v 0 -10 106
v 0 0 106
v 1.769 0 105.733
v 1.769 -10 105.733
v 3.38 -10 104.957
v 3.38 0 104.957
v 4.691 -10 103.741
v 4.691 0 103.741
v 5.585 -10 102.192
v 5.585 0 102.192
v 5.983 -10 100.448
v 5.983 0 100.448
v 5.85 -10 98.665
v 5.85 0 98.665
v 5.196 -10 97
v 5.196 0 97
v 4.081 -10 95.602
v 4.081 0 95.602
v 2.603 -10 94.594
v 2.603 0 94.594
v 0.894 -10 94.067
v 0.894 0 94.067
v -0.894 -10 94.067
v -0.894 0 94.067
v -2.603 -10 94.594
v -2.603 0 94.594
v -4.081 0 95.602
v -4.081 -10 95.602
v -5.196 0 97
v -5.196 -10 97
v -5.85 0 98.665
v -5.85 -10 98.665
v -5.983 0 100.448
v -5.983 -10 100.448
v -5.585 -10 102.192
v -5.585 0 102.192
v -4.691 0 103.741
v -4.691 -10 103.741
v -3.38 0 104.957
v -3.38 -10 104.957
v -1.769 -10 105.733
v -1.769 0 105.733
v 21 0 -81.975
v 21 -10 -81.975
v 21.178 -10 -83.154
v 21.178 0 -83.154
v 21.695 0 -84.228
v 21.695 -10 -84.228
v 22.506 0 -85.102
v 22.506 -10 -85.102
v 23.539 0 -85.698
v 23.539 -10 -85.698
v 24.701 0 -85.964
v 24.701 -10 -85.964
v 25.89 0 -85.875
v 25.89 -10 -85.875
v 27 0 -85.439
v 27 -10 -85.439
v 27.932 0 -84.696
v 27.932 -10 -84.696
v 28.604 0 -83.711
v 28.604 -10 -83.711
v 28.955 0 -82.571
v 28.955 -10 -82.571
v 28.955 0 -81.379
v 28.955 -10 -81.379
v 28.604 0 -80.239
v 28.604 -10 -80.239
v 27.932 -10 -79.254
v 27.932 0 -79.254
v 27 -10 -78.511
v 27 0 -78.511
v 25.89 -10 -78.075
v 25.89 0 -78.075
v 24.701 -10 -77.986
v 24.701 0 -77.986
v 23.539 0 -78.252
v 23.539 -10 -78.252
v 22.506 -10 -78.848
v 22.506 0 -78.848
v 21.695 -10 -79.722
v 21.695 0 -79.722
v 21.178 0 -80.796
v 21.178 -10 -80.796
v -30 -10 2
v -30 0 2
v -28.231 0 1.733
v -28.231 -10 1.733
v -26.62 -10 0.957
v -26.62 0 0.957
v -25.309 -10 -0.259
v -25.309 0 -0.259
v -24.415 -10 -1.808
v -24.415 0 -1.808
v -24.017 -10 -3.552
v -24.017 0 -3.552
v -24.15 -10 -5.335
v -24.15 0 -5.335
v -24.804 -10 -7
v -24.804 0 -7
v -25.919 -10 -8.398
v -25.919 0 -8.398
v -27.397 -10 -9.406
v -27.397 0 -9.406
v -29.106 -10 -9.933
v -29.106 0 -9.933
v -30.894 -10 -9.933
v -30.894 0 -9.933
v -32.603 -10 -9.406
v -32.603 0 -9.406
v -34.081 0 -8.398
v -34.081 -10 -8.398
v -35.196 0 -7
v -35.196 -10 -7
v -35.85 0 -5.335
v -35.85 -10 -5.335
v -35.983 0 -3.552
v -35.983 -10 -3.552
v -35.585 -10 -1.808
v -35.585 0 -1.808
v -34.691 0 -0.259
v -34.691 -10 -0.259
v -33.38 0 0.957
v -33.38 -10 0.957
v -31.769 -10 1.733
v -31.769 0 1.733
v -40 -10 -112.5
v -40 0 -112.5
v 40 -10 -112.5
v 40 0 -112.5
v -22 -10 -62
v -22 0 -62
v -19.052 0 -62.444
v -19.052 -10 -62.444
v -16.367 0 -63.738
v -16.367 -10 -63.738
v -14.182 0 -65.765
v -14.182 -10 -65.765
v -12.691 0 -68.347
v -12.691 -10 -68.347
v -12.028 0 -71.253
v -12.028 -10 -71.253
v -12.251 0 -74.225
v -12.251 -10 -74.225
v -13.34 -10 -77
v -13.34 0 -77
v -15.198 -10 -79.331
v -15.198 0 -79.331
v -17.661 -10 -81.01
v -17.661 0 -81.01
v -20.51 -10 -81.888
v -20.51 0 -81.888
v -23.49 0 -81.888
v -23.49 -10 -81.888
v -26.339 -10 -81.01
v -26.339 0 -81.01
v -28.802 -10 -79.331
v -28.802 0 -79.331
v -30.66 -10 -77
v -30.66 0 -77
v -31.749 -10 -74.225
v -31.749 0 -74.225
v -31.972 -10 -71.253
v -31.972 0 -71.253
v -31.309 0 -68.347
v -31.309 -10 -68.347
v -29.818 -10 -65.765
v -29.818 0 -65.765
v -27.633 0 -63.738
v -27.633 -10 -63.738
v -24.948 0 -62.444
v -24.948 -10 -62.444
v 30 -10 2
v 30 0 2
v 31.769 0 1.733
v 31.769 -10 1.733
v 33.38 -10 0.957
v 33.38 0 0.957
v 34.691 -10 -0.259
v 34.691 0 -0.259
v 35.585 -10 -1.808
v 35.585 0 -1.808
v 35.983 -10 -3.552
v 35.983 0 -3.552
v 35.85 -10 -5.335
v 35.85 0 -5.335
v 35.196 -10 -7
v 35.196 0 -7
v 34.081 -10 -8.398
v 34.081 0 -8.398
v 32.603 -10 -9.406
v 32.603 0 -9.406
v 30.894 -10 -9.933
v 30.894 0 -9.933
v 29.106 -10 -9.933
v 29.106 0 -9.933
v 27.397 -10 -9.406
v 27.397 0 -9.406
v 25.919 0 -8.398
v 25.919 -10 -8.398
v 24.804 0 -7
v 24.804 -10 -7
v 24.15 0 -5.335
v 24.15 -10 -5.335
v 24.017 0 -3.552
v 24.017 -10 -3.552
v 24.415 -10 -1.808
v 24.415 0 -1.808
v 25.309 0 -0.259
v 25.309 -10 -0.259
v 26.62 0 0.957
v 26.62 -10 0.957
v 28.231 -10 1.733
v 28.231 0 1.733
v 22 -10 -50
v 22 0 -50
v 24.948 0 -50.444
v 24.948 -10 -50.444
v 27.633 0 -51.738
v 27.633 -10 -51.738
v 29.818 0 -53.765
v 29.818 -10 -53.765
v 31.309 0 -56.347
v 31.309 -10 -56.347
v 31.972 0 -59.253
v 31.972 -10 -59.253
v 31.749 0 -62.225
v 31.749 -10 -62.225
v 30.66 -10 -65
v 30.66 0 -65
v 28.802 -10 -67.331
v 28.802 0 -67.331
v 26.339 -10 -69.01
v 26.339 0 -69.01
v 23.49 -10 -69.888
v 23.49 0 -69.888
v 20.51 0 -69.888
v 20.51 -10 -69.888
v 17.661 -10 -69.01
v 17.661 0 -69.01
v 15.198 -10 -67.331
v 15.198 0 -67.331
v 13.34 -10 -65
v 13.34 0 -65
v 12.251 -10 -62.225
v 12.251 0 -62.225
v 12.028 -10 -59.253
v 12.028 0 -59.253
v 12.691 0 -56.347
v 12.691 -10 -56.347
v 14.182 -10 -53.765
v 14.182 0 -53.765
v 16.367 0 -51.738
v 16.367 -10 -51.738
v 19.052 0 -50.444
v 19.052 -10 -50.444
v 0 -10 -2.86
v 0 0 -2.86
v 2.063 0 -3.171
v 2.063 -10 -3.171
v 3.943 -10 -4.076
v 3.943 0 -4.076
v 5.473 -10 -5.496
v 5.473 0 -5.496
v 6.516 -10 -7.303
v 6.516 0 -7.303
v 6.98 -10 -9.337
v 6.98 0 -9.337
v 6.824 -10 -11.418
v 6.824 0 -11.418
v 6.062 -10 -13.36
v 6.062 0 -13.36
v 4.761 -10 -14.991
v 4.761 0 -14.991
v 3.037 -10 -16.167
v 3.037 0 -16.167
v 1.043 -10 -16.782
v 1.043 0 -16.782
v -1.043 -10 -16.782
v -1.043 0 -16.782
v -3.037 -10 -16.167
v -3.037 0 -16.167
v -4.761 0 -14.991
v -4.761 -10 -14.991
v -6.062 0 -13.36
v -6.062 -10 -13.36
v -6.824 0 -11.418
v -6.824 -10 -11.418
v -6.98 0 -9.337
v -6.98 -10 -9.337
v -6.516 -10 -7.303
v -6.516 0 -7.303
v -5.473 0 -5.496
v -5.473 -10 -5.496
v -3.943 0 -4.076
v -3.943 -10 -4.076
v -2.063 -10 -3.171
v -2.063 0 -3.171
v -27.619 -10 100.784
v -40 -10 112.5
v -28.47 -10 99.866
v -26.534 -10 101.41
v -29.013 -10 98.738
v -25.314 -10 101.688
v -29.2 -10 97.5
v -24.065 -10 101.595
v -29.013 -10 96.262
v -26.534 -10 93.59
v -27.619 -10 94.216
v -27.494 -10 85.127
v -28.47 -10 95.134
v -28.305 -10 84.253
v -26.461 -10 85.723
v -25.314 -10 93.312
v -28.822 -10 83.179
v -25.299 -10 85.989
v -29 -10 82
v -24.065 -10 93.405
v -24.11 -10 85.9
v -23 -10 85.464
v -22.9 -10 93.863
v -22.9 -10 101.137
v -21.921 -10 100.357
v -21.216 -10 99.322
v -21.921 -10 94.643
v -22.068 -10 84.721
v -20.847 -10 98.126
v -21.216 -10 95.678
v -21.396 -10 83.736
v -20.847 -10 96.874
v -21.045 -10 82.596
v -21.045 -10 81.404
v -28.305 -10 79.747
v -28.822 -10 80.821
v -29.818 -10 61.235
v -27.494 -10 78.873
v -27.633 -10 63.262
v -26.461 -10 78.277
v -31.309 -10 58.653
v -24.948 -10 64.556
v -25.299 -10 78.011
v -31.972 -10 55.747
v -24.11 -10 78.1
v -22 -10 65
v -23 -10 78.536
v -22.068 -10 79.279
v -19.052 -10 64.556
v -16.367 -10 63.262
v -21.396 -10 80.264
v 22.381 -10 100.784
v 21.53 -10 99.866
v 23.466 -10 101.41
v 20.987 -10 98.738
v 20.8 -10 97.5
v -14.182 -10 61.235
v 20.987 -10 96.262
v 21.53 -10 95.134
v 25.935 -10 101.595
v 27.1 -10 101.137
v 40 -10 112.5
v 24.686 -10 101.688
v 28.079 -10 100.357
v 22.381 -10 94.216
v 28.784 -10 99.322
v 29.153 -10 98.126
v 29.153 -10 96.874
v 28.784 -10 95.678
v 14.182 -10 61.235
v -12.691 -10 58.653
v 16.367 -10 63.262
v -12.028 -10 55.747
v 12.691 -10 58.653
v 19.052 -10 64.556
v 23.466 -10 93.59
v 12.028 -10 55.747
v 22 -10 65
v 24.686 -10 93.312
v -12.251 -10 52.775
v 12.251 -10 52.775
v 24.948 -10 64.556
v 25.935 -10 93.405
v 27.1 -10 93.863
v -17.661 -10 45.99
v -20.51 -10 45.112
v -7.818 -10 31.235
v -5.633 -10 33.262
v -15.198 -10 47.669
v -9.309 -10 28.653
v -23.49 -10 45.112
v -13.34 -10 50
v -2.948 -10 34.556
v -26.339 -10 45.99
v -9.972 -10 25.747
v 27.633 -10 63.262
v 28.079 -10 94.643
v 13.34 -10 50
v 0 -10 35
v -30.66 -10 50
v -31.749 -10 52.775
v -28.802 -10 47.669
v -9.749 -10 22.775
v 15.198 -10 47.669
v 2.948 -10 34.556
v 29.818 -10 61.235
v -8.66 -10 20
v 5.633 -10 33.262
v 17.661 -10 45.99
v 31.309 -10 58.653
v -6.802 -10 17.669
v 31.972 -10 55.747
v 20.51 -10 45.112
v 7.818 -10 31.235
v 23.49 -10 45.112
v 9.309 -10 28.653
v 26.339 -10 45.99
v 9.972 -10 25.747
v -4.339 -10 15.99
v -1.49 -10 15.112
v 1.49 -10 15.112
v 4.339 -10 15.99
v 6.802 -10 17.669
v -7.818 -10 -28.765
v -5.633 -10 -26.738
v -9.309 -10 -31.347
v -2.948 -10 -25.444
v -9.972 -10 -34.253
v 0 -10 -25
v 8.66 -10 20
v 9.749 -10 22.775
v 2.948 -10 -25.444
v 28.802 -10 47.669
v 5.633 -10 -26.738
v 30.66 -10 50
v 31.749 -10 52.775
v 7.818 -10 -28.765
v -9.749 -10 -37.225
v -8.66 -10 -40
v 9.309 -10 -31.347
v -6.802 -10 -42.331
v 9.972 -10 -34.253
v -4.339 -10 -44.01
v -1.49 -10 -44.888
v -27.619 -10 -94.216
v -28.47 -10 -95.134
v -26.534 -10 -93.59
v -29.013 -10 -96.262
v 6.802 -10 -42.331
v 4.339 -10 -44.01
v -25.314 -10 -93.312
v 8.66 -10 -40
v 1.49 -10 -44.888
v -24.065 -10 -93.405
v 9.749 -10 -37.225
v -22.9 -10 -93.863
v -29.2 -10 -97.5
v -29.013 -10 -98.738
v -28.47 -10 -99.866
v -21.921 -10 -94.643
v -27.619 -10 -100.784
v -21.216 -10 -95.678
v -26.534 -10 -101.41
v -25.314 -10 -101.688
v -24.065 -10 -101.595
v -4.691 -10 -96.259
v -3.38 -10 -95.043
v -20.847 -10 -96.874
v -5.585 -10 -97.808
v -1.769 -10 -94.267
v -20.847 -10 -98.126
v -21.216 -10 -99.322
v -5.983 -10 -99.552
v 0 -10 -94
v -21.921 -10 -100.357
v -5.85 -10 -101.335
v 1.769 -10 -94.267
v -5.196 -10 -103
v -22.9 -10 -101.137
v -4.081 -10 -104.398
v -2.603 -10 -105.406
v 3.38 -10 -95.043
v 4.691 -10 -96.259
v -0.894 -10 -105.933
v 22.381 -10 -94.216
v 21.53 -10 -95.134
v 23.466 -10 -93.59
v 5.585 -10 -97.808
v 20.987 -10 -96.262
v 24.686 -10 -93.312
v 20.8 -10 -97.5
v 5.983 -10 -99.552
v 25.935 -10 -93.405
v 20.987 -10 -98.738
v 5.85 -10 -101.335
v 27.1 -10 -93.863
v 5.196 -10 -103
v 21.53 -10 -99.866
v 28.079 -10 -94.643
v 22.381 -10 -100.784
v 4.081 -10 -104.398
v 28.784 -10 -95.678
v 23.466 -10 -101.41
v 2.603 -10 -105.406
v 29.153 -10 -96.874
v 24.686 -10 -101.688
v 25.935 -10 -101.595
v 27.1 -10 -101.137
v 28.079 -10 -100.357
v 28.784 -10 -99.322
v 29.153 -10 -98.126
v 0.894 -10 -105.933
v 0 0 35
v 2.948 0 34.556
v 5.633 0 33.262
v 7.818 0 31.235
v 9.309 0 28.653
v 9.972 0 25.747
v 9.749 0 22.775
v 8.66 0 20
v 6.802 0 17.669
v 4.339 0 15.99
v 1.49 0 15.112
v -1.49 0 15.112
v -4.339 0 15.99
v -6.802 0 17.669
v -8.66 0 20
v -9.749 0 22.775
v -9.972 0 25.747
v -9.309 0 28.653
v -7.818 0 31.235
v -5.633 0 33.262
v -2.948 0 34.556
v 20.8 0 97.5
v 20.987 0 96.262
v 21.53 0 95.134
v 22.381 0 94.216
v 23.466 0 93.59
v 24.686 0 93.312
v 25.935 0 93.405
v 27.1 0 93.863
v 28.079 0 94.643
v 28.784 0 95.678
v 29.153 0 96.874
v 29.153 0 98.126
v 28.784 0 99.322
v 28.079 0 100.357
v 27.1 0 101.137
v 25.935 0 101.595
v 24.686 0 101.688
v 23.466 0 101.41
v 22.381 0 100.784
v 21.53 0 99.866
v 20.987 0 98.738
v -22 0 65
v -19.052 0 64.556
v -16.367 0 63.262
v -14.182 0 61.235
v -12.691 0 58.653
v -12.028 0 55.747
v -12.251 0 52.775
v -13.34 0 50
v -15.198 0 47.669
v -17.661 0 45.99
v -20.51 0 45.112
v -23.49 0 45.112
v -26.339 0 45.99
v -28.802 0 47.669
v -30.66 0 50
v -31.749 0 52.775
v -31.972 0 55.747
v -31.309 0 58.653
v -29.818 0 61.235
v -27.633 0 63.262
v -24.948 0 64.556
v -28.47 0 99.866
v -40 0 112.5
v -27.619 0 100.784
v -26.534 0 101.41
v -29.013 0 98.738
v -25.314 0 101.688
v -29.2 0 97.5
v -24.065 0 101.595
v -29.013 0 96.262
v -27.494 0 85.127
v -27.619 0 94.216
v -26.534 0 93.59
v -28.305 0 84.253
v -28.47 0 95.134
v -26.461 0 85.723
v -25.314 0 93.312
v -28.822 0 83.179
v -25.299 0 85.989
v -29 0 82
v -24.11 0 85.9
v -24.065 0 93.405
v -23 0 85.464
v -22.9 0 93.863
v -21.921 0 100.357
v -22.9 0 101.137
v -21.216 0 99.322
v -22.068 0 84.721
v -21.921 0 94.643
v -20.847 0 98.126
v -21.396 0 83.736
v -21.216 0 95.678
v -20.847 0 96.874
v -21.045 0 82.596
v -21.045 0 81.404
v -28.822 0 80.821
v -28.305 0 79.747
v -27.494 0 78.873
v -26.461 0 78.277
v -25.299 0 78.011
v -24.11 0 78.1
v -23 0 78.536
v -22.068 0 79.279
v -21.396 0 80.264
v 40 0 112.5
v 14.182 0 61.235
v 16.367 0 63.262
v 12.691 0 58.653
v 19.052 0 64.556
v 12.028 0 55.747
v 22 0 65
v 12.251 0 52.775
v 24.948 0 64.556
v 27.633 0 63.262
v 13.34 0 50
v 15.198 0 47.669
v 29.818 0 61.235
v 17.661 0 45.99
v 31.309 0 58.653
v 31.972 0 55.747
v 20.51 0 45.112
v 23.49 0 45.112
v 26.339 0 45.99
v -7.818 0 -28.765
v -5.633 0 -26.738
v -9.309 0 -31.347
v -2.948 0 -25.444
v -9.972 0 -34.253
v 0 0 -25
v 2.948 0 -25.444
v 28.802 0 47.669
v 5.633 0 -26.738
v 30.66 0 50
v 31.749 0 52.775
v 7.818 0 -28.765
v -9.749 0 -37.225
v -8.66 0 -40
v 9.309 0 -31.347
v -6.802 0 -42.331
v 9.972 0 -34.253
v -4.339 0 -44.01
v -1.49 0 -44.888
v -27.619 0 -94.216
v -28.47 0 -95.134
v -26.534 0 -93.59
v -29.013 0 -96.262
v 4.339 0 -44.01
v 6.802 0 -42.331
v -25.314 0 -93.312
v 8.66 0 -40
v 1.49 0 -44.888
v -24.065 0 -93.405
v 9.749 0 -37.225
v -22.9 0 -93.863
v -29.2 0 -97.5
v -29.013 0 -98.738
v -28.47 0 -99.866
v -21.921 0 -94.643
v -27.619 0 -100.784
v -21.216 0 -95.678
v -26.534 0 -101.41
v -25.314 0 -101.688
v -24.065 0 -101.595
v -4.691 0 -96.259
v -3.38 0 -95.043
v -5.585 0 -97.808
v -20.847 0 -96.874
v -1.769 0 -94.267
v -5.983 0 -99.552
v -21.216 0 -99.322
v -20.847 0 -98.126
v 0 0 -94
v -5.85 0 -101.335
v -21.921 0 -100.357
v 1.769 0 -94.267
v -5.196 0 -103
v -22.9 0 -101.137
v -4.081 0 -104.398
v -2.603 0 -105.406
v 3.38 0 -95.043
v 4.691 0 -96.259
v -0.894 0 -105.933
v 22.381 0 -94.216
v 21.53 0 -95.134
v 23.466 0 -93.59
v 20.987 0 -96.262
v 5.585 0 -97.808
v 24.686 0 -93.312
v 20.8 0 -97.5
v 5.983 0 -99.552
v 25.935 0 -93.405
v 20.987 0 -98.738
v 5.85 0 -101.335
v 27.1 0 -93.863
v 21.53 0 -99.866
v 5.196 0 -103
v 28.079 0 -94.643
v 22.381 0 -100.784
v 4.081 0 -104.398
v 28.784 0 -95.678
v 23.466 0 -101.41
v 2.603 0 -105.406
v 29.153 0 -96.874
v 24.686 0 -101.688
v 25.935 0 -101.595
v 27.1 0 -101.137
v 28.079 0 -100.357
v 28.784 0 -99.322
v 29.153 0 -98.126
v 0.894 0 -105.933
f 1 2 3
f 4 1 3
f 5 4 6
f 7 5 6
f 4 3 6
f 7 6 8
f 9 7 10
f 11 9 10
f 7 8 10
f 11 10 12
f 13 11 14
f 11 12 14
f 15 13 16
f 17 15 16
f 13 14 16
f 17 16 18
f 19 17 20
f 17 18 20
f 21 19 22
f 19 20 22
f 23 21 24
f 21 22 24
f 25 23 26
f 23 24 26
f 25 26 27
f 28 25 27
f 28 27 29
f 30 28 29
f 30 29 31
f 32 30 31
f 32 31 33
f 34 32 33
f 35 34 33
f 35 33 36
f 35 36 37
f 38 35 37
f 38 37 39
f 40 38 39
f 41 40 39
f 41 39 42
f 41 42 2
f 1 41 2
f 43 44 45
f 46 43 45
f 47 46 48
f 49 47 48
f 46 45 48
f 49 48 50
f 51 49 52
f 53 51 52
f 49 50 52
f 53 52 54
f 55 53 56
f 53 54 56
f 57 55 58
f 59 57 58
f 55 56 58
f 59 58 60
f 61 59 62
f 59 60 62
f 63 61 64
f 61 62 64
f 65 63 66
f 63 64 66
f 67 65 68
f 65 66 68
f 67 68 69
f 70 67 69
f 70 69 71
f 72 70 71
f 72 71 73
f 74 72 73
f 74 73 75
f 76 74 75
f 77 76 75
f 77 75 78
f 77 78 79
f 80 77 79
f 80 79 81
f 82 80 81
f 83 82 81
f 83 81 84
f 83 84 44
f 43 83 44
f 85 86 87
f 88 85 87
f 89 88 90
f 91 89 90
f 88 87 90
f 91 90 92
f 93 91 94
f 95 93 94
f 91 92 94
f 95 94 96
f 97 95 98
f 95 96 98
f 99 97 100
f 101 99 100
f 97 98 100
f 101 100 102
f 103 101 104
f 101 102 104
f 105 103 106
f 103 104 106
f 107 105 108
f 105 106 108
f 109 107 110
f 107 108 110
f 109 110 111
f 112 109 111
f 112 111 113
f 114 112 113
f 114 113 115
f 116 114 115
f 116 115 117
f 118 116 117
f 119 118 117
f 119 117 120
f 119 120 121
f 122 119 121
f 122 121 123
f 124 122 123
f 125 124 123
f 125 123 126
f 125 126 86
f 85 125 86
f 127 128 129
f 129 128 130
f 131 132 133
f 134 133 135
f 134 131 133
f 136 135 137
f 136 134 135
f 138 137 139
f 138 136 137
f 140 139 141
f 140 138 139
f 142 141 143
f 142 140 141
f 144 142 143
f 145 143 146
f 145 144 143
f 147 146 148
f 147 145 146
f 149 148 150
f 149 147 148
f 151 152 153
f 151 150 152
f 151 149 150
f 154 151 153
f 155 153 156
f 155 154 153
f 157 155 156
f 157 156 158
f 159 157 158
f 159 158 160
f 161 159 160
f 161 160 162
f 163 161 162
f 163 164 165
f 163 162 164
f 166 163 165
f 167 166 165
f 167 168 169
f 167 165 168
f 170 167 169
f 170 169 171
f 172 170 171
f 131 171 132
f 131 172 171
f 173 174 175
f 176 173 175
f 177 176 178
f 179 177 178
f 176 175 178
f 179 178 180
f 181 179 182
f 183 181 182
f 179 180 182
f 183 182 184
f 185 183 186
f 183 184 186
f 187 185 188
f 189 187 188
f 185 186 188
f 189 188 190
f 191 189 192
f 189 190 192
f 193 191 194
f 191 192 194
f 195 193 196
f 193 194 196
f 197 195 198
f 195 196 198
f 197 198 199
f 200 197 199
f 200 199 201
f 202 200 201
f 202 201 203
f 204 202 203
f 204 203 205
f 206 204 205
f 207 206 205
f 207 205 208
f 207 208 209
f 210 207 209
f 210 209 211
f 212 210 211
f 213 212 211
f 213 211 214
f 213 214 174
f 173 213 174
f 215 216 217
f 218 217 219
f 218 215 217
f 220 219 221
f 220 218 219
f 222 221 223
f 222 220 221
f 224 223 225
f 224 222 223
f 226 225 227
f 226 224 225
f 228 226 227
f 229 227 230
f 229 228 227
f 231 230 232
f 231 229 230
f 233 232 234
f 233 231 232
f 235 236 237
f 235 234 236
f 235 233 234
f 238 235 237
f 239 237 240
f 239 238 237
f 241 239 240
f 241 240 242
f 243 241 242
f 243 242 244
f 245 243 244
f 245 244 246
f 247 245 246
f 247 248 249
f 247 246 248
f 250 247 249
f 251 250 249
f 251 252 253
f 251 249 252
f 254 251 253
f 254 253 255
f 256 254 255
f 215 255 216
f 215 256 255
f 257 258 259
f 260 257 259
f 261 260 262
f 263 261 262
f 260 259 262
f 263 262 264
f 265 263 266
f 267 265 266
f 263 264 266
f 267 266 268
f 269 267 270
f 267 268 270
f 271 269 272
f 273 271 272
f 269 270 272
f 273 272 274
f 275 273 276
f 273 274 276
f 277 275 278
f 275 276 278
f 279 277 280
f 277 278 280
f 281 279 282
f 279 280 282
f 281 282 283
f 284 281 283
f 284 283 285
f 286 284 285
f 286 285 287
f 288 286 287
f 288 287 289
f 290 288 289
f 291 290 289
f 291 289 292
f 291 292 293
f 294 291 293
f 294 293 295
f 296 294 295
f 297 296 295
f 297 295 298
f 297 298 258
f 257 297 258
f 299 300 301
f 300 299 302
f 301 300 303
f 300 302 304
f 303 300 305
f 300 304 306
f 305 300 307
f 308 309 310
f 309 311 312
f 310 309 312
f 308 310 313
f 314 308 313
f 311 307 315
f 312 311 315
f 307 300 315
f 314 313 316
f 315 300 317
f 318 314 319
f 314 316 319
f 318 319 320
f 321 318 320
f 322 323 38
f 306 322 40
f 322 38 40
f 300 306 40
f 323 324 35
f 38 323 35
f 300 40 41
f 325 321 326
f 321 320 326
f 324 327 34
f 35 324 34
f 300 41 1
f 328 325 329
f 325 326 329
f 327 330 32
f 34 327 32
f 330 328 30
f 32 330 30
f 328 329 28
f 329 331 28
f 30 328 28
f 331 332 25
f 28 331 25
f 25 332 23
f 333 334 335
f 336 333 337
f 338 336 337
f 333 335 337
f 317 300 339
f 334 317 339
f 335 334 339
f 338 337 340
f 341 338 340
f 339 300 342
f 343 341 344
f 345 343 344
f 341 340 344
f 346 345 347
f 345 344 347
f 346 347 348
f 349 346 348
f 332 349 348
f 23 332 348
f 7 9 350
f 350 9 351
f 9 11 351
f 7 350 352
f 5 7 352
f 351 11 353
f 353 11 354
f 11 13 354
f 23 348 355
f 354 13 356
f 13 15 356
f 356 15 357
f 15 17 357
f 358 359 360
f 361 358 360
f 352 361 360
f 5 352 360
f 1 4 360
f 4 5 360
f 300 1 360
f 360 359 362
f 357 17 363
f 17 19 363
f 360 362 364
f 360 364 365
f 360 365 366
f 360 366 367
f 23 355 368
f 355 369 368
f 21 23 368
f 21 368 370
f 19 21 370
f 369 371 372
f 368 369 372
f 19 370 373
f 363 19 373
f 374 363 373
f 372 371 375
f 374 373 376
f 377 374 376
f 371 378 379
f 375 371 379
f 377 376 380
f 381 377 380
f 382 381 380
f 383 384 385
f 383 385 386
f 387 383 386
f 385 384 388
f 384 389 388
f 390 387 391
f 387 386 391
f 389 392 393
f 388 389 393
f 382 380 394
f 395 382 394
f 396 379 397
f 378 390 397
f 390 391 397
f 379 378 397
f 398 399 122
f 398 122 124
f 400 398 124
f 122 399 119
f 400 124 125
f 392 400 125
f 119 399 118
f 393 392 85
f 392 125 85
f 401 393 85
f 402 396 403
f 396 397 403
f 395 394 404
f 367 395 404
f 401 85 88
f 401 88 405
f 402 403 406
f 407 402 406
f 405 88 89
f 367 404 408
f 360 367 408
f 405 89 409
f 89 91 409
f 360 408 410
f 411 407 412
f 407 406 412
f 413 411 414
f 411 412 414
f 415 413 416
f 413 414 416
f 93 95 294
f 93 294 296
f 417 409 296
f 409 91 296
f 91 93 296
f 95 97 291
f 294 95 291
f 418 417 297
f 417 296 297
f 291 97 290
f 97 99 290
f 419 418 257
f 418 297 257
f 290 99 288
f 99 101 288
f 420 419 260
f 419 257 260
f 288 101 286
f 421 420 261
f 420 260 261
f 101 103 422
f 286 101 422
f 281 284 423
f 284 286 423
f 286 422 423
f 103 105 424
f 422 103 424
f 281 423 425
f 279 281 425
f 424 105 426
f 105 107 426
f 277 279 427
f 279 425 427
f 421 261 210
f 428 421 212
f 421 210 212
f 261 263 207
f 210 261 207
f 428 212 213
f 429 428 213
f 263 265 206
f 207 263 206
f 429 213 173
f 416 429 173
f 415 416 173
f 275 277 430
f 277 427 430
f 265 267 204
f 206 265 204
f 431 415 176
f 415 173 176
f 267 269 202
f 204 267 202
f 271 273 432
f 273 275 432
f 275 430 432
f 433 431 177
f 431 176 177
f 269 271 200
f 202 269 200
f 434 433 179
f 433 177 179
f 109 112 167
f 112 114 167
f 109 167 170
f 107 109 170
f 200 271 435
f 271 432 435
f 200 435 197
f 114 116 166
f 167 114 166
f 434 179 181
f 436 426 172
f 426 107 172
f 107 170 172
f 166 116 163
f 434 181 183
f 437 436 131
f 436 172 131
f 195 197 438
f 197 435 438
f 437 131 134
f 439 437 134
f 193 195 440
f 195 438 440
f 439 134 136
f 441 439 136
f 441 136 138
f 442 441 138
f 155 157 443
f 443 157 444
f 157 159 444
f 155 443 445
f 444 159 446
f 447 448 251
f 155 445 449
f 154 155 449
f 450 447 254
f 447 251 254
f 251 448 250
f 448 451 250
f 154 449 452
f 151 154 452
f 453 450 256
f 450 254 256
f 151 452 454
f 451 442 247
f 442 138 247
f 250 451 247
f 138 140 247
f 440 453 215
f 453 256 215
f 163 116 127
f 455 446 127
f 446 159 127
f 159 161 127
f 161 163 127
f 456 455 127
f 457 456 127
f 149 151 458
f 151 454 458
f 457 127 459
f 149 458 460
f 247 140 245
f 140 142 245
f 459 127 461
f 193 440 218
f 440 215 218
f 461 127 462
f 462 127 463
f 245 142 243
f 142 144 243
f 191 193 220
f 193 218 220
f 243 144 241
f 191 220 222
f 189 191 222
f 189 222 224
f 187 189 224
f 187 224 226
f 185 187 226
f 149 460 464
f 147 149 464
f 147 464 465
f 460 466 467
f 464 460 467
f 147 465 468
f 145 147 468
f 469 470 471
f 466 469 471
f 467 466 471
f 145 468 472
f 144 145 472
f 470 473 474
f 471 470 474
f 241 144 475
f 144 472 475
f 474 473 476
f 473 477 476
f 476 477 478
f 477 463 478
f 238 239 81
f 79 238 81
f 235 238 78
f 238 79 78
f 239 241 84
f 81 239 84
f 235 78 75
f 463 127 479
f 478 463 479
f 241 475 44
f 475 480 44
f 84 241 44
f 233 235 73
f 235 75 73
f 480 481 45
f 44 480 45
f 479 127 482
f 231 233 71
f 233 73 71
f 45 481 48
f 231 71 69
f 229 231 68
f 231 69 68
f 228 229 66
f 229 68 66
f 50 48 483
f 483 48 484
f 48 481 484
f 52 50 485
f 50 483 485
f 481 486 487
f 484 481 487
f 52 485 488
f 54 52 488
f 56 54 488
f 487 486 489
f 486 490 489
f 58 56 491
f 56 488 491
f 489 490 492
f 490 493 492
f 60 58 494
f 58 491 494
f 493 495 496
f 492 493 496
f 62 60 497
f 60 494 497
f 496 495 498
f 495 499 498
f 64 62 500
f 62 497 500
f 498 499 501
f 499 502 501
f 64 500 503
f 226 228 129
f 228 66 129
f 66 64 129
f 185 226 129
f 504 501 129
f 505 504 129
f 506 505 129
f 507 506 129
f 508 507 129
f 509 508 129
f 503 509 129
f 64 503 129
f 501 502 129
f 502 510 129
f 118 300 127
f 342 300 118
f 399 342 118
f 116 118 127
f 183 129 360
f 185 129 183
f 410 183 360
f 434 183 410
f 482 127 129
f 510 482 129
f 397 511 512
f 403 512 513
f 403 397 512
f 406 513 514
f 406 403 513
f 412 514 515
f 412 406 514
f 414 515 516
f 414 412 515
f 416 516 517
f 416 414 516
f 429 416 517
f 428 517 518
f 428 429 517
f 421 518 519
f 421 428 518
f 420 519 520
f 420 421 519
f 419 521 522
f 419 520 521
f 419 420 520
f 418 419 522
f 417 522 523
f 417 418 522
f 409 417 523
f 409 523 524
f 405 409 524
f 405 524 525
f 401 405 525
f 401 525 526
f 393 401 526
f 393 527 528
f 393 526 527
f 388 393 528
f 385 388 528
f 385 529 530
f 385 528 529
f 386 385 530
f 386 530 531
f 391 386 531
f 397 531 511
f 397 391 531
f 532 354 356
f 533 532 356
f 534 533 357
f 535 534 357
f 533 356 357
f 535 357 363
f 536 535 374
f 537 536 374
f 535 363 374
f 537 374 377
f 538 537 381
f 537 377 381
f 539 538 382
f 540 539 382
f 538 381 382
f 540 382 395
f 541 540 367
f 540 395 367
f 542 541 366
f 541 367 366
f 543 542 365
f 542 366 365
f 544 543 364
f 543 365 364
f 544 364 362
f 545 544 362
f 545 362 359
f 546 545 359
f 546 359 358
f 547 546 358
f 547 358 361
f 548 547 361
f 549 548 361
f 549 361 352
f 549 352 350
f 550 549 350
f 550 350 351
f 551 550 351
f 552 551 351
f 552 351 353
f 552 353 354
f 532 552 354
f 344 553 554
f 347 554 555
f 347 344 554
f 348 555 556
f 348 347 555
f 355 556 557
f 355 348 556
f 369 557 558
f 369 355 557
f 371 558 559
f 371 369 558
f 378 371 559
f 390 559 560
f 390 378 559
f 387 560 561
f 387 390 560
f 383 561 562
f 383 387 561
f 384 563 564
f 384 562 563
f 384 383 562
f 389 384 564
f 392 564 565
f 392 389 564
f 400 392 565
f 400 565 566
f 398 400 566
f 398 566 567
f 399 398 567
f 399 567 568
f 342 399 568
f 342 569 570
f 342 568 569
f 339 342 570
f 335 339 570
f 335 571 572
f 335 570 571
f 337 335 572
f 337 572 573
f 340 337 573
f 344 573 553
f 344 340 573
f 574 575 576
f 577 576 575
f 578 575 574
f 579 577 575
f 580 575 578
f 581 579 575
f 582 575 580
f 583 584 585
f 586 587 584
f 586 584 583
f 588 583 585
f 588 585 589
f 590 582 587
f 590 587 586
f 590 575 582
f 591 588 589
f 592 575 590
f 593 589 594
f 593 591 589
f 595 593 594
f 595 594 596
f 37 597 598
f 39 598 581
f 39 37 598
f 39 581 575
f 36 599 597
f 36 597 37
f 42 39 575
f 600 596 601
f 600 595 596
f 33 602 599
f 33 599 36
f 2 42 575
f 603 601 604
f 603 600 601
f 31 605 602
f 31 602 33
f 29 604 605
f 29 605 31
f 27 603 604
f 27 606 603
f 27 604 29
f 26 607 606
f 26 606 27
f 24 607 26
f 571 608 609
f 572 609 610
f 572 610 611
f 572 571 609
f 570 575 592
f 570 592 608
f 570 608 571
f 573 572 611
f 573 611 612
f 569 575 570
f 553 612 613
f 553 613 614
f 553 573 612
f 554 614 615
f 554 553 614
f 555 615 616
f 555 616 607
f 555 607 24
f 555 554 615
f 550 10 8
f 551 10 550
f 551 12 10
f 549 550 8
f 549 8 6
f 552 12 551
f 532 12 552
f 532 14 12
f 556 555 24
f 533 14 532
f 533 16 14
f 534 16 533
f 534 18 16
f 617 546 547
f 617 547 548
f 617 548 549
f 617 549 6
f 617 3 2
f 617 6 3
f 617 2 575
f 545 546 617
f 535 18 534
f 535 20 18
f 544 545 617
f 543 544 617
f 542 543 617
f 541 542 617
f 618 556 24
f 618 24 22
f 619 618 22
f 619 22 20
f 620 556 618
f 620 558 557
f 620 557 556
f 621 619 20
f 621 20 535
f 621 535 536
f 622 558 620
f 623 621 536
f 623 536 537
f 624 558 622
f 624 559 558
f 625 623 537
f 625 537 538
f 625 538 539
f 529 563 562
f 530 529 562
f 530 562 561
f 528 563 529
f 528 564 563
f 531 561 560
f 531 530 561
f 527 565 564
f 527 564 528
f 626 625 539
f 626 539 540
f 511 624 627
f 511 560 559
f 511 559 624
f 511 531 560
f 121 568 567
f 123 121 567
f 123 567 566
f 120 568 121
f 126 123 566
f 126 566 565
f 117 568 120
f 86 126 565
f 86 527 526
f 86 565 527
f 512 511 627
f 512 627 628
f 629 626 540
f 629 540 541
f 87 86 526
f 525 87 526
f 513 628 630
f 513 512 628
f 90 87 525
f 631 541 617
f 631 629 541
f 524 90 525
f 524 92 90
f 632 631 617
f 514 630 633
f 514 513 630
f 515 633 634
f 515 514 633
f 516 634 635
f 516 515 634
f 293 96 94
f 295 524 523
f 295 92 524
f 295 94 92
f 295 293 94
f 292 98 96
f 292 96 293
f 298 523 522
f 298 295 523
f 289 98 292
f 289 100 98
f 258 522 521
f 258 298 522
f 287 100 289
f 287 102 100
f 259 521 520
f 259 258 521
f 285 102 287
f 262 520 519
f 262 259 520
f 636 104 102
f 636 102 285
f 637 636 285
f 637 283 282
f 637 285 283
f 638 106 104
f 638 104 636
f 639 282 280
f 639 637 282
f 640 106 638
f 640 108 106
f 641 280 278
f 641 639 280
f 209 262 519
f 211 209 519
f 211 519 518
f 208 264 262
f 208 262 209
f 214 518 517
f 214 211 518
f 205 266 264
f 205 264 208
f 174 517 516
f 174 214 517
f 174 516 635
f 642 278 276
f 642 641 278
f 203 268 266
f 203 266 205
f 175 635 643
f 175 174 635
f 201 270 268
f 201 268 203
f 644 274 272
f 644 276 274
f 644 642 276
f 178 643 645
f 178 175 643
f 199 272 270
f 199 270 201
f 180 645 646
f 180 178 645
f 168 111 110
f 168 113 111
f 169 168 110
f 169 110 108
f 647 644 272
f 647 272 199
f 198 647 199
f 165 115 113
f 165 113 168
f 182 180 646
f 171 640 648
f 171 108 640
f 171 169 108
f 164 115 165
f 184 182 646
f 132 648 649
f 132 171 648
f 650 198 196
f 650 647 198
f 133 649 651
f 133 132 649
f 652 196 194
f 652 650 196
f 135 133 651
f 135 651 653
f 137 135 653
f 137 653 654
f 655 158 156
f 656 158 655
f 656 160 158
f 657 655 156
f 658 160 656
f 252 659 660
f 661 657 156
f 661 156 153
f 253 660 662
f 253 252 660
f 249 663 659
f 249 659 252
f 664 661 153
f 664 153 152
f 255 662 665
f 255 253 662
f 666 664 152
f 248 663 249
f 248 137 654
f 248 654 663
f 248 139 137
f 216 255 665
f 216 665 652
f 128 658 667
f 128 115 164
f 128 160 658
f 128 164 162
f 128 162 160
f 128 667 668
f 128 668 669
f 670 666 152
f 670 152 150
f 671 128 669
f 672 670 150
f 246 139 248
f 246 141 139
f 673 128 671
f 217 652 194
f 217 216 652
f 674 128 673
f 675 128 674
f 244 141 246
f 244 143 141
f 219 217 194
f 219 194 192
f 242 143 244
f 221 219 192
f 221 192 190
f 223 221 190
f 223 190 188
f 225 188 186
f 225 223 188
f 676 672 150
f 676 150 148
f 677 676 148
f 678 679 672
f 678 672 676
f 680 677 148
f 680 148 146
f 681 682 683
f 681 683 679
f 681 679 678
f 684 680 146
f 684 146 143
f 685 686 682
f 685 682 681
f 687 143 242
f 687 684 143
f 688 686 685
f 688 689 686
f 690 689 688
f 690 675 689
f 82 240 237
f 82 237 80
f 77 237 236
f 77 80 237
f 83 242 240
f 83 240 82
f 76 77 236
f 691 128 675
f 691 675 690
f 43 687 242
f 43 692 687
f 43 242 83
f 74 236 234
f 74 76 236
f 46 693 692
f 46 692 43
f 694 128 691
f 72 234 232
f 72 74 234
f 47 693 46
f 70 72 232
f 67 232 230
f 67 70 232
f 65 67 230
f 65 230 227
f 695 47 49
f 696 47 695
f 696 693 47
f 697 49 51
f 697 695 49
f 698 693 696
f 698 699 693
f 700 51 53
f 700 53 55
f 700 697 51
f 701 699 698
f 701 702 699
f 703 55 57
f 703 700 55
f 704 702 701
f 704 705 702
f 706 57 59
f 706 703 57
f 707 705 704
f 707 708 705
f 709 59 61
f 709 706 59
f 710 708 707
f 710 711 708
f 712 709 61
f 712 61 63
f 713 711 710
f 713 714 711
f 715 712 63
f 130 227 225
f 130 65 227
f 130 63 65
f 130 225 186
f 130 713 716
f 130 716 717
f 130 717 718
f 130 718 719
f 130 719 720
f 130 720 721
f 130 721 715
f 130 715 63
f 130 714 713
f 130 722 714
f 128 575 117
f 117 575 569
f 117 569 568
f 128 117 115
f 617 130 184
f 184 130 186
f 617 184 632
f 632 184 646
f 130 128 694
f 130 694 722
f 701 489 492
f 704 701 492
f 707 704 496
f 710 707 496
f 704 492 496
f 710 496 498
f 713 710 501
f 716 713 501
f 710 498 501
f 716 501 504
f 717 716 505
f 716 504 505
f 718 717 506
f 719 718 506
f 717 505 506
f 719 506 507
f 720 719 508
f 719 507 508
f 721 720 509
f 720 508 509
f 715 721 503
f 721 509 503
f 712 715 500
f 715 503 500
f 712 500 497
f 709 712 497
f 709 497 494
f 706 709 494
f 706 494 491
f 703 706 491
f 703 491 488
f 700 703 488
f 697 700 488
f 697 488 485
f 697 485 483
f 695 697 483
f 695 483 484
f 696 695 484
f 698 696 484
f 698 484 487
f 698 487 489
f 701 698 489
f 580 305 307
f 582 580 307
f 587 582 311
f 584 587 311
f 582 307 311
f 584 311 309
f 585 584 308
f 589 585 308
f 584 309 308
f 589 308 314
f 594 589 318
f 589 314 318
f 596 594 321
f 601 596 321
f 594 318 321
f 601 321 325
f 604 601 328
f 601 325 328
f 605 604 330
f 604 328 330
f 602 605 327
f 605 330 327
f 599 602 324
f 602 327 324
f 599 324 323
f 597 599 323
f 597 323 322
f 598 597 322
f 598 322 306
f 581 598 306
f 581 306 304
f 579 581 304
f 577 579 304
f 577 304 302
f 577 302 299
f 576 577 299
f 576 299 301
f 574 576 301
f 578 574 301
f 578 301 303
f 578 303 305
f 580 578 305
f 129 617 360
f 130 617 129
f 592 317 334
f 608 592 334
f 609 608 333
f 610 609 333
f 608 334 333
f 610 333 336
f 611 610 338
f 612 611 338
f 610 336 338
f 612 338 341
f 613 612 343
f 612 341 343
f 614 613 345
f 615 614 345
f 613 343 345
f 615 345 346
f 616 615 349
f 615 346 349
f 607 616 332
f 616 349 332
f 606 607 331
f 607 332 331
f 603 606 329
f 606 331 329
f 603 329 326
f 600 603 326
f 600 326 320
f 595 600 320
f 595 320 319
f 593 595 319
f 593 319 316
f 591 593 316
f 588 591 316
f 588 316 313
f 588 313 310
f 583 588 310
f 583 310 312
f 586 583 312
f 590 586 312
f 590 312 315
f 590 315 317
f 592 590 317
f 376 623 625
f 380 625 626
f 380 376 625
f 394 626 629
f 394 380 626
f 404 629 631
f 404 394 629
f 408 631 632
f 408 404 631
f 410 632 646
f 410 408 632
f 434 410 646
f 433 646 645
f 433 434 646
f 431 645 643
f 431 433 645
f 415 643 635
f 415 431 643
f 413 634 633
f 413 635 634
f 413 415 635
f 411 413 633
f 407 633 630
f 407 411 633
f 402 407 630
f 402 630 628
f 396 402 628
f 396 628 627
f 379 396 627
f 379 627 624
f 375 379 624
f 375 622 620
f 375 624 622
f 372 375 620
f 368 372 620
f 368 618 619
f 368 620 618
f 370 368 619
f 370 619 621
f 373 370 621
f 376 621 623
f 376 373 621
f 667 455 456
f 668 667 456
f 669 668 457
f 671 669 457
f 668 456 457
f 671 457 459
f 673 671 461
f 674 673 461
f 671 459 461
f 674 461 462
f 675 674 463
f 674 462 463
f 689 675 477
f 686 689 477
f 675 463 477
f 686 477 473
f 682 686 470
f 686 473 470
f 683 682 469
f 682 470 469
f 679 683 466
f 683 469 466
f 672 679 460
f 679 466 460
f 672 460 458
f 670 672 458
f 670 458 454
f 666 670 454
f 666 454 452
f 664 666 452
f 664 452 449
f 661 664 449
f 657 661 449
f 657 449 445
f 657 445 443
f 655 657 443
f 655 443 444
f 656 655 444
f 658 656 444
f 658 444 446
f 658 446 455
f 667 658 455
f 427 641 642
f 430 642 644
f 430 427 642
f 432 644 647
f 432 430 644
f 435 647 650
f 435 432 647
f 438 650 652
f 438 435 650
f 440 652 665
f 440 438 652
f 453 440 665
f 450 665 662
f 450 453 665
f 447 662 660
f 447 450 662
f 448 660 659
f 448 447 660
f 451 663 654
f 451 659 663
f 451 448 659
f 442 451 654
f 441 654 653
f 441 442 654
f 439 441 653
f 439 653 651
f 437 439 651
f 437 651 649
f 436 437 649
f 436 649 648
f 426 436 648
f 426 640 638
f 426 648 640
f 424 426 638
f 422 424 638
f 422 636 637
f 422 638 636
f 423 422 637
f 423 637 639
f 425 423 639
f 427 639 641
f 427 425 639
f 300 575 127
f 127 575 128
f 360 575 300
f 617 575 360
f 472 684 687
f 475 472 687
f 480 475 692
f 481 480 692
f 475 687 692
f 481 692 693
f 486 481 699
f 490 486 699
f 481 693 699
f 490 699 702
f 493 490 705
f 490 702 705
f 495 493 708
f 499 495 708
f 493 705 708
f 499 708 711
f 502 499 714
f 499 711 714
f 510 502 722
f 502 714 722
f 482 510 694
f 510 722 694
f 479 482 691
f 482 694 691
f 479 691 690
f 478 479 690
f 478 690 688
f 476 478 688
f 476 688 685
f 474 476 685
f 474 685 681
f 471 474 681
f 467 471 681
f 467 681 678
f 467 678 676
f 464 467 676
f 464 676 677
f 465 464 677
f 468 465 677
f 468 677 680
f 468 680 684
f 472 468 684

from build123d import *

# Parameters (mm, degrees)
SKETCH1_W             = 80
SKETCH1_H             = 225
BOSS_EXTRUDE1_DEPTH   = 10
CUT_EXTRUDE1_REACH    = 121.818
SKETCH2_R             = 6
M8_CLEARANCE_HOLE1_D  = 8.4
F_8_0MM_DOWEL_HOLE1_D = 8
CUT_EXTRUDE3_REACH    = 121.818
SKETCH10_R            = 7
SKETCH14_R            = 10
CUT_EXTRUDE4_DEPTH    = 120.817569663


with BuildPart() as part:
    # Sketch1 → Boss-Extrude1 (new body)
    with BuildSketch(Plane(origin=(0, 0, 0), x_dir=(1, 0, 0), z_dir=(0, 1, 0))):
        Rectangle(SKETCH1_W, SKETCH1_H)
    extrude(amount=-BOSS_EXTRUDE1_DEPTH)

    # Sketch2 → Cut-Extrude1 (cut, up to next)
    with BuildSketch(Plane(origin=(0, 0, 0), x_dir=(1, 0, 0), z_dir=(0, 1, 0)), mode=Mode.PRIVATE) as cut_extrude1_sk1:
        with Locations(Location((0, 100, 0), (0, 0, 270))):
            Circle(SKETCH2_R)
    cut_extrude1_tool1 = extrude(cut_extrude1_sk1.sketch, amount=-CUT_EXTRUDE1_REACH, mode=Mode.PRIVATE) & part.part
    # Sketch2 → Cut-Extrude1 (cut, up to next)
    with BuildSketch(Plane(origin=(0, 0, 0), x_dir=(1, 0, 0), z_dir=(0, 1, 0)), mode=Mode.PRIVATE) as cut_extrude1_sk2:
        with Locations(Location((30, 4, 0), (0, 0, 270))):
            Circle(SKETCH2_R)
    cut_extrude1_tool2 = extrude(cut_extrude1_sk2.sketch, amount=-CUT_EXTRUDE1_REACH, mode=Mode.PRIVATE) & part.part
    # Sketch2 → Cut-Extrude1 (cut, up to next)
    with BuildSketch(Plane(origin=(0, 0, 0), x_dir=(1, 0, 0), z_dir=(0, 1, 0)), mode=Mode.PRIVATE) as cut_extrude1_sk3:
        with Locations(Location((-30, 4, 0), (0, 0, 270))):
            Circle(SKETCH2_R)
    cut_extrude1_tool3 = extrude(cut_extrude1_sk3.sketch, amount=-CUT_EXTRUDE1_REACH, mode=Mode.PRIVATE) & part.part
    # Sketch2 → Cut-Extrude1 (cut, up to next)
    with BuildSketch(Plane(origin=(0, 0, 0), x_dir=(1, 0, 0), z_dir=(0, 1, 0)), mode=Mode.PRIVATE) as cut_extrude1_sk4:
        with Locations(Location((0, -100, 0), (0, 0, 270))):
            Circle(SKETCH2_R)
    cut_extrude1_tool4 = extrude(cut_extrude1_sk4.sketch, amount=-CUT_EXTRUDE1_REACH, mode=Mode.PRIVATE) & part.part
    add(cut_extrude1_tool1.solids().sort_by_distance((0, 0, -100))[0], mode=Mode.SUBTRACT)
    add(cut_extrude1_tool2.solids().sort_by_distance((30, 0, -4))[0], mode=Mode.SUBTRACT)
    add(cut_extrude1_tool3.solids().sort_by_distance((-30, 0, -4))[0], mode=Mode.SUBTRACT)
    add(cut_extrude1_tool4.solids().sort_by_distance((0, 0, 100))[0], mode=Mode.SUBTRACT)

    # M8 Clearance Hole1 (through all)
    with Locations(Plane(origin=(0, 0, 0), x_dir=(1, 0, 0), z_dir=(0, 1, 0))):
        with Locations((-25, 97.5), (25, 97.5), (25, -97.5), (-25, -97.5)):
            Hole(M8_CLEARANCE_HOLE1_D / 2)

    # Ø8.0mm Dowel Hole1 (through all)
    with Locations(Plane(origin=(0, 0, 0), x_dir=(1, 0, 0), z_dir=(0, 1, 0))):
        with Locations((25, 81.975), (-25, -82)):
            Hole(F_8_0MM_DOWEL_HOLE1_D / 2)

    # Sketch10 → Cut-Extrude3 (cut, up to next)
    with BuildSketch(Plane(origin=(0, 0, 0), x_dir=(1, 0, 0), z_dir=(0, 1, 0)), mode=Mode.PRIVATE) as cut_extrude3_sk1:
        with Locations(Location((0, 9.86, 0), (0, 0, 270))):
            Circle(SKETCH10_R)
    cut_extrude3_tool1 = extrude(cut_extrude3_sk1.sketch, amount=-CUT_EXTRUDE3_REACH, mode=Mode.PRIVATE) & part.part
    add(cut_extrude3_tool1.solids().sort_by_distance((0, 0, -9.86))[0], mode=Mode.SUBTRACT)

    # Sketch14 → Cut-Extrude4 (cut, through all)
    with BuildSketch(Plane(origin=(0, -10, 0), x_dir=(1, 0, 0), z_dir=(0, 1, 0))):
        with Locations(Location((22, 60, 0), (0, 0, 270))):
            Circle(SKETCH14_R)
        with Locations(Location((-22, 72, 0), (0, 0, 270))):
            Circle(SKETCH14_R)
        with Locations(Location((0, 35, 0), (0, 0, 270))):
            Circle(SKETCH14_R)
        with Locations(Location((0, -25, 0), (0, 0, 270))):
            Circle(SKETCH14_R)
        with Locations(Location((-22, -55, 0), (0, 0, 270))):
            Circle(SKETCH14_R)
        with Locations(Location((22, -55, 0), (0, 0, 270))):
            Circle(SKETCH14_R)
    extrude(amount=CUT_EXTRUDE4_DEPTH, mode=Mode.SUBTRACT)


solid = part.part
